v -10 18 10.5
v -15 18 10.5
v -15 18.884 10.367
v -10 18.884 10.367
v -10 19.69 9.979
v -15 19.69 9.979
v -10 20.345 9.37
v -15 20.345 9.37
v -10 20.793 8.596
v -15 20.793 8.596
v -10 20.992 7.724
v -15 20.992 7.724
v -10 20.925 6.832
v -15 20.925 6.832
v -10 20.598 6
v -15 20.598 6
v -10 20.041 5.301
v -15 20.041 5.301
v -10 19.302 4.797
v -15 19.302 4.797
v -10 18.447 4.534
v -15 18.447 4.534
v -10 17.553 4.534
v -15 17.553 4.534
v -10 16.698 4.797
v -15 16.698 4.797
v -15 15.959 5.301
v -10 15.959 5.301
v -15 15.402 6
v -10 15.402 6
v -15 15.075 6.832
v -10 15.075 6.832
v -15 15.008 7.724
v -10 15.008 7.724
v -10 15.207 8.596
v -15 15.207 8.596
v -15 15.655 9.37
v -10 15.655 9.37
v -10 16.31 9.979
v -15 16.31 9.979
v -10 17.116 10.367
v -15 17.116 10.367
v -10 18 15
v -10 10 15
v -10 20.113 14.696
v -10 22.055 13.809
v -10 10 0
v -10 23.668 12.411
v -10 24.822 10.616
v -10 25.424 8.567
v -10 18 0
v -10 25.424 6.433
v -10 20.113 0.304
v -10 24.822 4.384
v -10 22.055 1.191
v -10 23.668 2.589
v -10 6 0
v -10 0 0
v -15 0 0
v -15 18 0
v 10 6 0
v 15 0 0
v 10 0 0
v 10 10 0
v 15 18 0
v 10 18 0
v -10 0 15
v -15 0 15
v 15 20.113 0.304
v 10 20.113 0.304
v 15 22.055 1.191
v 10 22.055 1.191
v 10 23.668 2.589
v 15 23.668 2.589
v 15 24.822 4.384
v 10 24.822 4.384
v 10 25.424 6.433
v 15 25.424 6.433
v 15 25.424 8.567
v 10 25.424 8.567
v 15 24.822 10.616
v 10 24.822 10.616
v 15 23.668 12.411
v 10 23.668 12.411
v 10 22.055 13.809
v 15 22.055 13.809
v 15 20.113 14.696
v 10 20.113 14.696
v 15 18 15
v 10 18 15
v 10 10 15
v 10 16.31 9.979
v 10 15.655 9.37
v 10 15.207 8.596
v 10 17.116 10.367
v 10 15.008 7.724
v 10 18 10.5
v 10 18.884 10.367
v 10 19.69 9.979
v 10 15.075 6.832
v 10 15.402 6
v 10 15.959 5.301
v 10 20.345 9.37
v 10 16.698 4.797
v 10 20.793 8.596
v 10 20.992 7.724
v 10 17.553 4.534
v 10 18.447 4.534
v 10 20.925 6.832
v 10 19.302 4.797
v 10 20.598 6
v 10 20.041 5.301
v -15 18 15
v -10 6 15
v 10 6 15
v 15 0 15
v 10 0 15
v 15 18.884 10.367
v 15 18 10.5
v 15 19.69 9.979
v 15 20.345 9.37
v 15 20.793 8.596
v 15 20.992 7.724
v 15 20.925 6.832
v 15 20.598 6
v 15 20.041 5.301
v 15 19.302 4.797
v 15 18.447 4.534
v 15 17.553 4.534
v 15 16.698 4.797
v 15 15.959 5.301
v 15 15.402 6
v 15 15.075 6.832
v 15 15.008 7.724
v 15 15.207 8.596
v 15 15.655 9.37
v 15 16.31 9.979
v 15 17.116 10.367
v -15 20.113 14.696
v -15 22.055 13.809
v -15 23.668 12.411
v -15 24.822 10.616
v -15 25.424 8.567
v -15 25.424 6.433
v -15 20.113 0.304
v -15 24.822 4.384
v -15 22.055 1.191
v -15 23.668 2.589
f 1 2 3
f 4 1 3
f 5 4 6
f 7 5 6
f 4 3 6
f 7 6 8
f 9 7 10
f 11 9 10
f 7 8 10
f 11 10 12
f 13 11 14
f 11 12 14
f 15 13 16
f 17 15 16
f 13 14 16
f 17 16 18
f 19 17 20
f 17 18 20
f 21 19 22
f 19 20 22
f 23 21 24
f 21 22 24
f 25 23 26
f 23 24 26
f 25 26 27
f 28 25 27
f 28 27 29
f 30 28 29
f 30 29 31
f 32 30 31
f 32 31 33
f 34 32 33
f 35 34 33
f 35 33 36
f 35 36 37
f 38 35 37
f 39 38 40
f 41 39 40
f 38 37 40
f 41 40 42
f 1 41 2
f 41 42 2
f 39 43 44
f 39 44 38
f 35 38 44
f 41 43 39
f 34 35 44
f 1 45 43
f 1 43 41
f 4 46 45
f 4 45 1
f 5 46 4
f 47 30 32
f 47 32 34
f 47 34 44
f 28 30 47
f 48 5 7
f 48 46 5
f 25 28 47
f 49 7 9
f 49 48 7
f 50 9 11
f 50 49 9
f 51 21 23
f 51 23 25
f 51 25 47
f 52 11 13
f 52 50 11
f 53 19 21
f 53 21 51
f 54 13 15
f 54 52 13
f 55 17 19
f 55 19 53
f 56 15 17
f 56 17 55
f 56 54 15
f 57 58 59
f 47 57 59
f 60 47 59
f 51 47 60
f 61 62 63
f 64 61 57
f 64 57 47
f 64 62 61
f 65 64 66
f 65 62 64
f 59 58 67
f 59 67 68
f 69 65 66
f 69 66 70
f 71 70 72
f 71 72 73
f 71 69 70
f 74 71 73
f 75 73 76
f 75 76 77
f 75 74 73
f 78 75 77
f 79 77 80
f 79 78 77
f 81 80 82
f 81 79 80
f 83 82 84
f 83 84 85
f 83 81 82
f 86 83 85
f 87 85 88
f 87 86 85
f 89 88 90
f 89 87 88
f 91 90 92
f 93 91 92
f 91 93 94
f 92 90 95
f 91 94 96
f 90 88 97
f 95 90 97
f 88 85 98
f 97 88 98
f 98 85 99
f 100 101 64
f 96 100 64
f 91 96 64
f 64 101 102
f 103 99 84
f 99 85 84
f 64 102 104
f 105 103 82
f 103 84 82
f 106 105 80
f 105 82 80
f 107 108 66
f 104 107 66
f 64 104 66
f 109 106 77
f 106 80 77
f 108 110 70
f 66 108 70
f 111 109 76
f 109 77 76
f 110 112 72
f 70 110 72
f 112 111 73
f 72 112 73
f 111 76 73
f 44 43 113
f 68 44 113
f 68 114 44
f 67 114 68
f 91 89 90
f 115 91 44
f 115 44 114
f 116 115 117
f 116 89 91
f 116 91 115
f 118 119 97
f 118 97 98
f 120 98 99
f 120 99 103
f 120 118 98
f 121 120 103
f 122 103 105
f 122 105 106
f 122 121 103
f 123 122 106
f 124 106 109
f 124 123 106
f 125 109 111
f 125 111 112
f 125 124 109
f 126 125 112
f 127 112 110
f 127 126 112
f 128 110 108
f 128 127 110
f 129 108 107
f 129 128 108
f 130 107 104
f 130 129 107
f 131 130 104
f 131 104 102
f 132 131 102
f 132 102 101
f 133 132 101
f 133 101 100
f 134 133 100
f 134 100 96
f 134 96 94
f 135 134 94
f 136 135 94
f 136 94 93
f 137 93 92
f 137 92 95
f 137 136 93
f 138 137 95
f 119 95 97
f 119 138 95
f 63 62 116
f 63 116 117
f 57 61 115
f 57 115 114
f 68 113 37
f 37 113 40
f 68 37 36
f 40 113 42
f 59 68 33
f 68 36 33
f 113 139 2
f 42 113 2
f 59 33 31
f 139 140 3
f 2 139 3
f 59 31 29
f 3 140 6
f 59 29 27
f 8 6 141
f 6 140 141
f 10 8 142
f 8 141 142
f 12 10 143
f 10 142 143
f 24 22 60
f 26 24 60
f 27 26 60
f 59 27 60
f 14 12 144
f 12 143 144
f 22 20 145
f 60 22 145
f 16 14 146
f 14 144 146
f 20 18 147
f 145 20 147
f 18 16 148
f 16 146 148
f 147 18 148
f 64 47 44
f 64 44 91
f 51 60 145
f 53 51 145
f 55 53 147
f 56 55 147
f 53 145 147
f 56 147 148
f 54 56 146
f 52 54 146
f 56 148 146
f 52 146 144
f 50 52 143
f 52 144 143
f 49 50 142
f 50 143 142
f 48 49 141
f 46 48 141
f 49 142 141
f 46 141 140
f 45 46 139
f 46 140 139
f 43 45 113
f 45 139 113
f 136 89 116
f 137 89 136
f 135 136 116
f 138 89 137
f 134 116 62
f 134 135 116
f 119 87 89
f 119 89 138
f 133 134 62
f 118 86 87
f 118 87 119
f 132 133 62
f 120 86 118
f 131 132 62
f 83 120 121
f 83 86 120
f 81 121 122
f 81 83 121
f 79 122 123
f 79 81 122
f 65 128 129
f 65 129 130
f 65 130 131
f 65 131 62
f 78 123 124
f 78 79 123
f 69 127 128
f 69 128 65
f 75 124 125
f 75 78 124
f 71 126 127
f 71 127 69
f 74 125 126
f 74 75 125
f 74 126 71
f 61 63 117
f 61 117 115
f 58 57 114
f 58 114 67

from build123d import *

# Parameters (mm, degrees)
EXTRUDE_1_DEPTH     = 15
EXTRUDE_2_DEPTH     = 5
SKETCH_4_R          = 3
CUT_EXTRUDE_1_DEPTH = 5


with BuildPart() as part:
    # 草图1 → 凸台-拉伸1 (new body)
    with BuildSketch(Plane.XY):
        Polygon((10, 6), (-10, 6), (-10, 0), (-15, 0), (-15, 10), (15, 10), (15, 0), (10, 0), align=None)
    extrude(amount=EXTRUDE_1_DEPTH)

    # 草图2 → 凸台-拉伸2 (add)
    with BuildSketch(Plane.ZY.offset(15)):
        with BuildLine():
            Line((0, 10), (0, 18))
            ThreePointArc((0, 18), (7.5, 25.5), (15, 18))
            Line((15, 18), (15, 10))
            Line((15, 10), (0, 10))
        make_face()
    extrude_2 = extrude(amount=-EXTRUDE_2_DEPTH)

    # 草图4 → 切除-拉伸1 (cut)
    with BuildSketch(Plane.ZY.offset(15)):
        with Locations((7.5, 18)):
            Circle(SKETCH_4_R)
    cut_extrude_1 = extrude(amount=-CUT_EXTRUDE_1_DEPTH, mode=Mode.SUBTRACT)

    # 镜向2: 凸台-拉伸2, 切除-拉伸1 across plane
    add(extrude_2.mirror(Plane(origin=(0, 0, 0), x_dir=(0, 0, 1), z_dir=(1, 0, 0))))
    add(cut_extrude_1.mirror(Plane(origin=(0, 0, 0), x_dir=(0, 0, 1), z_dir=(1, 0, 0))), mode=Mode.SUBTRACT)


solid = part.part
